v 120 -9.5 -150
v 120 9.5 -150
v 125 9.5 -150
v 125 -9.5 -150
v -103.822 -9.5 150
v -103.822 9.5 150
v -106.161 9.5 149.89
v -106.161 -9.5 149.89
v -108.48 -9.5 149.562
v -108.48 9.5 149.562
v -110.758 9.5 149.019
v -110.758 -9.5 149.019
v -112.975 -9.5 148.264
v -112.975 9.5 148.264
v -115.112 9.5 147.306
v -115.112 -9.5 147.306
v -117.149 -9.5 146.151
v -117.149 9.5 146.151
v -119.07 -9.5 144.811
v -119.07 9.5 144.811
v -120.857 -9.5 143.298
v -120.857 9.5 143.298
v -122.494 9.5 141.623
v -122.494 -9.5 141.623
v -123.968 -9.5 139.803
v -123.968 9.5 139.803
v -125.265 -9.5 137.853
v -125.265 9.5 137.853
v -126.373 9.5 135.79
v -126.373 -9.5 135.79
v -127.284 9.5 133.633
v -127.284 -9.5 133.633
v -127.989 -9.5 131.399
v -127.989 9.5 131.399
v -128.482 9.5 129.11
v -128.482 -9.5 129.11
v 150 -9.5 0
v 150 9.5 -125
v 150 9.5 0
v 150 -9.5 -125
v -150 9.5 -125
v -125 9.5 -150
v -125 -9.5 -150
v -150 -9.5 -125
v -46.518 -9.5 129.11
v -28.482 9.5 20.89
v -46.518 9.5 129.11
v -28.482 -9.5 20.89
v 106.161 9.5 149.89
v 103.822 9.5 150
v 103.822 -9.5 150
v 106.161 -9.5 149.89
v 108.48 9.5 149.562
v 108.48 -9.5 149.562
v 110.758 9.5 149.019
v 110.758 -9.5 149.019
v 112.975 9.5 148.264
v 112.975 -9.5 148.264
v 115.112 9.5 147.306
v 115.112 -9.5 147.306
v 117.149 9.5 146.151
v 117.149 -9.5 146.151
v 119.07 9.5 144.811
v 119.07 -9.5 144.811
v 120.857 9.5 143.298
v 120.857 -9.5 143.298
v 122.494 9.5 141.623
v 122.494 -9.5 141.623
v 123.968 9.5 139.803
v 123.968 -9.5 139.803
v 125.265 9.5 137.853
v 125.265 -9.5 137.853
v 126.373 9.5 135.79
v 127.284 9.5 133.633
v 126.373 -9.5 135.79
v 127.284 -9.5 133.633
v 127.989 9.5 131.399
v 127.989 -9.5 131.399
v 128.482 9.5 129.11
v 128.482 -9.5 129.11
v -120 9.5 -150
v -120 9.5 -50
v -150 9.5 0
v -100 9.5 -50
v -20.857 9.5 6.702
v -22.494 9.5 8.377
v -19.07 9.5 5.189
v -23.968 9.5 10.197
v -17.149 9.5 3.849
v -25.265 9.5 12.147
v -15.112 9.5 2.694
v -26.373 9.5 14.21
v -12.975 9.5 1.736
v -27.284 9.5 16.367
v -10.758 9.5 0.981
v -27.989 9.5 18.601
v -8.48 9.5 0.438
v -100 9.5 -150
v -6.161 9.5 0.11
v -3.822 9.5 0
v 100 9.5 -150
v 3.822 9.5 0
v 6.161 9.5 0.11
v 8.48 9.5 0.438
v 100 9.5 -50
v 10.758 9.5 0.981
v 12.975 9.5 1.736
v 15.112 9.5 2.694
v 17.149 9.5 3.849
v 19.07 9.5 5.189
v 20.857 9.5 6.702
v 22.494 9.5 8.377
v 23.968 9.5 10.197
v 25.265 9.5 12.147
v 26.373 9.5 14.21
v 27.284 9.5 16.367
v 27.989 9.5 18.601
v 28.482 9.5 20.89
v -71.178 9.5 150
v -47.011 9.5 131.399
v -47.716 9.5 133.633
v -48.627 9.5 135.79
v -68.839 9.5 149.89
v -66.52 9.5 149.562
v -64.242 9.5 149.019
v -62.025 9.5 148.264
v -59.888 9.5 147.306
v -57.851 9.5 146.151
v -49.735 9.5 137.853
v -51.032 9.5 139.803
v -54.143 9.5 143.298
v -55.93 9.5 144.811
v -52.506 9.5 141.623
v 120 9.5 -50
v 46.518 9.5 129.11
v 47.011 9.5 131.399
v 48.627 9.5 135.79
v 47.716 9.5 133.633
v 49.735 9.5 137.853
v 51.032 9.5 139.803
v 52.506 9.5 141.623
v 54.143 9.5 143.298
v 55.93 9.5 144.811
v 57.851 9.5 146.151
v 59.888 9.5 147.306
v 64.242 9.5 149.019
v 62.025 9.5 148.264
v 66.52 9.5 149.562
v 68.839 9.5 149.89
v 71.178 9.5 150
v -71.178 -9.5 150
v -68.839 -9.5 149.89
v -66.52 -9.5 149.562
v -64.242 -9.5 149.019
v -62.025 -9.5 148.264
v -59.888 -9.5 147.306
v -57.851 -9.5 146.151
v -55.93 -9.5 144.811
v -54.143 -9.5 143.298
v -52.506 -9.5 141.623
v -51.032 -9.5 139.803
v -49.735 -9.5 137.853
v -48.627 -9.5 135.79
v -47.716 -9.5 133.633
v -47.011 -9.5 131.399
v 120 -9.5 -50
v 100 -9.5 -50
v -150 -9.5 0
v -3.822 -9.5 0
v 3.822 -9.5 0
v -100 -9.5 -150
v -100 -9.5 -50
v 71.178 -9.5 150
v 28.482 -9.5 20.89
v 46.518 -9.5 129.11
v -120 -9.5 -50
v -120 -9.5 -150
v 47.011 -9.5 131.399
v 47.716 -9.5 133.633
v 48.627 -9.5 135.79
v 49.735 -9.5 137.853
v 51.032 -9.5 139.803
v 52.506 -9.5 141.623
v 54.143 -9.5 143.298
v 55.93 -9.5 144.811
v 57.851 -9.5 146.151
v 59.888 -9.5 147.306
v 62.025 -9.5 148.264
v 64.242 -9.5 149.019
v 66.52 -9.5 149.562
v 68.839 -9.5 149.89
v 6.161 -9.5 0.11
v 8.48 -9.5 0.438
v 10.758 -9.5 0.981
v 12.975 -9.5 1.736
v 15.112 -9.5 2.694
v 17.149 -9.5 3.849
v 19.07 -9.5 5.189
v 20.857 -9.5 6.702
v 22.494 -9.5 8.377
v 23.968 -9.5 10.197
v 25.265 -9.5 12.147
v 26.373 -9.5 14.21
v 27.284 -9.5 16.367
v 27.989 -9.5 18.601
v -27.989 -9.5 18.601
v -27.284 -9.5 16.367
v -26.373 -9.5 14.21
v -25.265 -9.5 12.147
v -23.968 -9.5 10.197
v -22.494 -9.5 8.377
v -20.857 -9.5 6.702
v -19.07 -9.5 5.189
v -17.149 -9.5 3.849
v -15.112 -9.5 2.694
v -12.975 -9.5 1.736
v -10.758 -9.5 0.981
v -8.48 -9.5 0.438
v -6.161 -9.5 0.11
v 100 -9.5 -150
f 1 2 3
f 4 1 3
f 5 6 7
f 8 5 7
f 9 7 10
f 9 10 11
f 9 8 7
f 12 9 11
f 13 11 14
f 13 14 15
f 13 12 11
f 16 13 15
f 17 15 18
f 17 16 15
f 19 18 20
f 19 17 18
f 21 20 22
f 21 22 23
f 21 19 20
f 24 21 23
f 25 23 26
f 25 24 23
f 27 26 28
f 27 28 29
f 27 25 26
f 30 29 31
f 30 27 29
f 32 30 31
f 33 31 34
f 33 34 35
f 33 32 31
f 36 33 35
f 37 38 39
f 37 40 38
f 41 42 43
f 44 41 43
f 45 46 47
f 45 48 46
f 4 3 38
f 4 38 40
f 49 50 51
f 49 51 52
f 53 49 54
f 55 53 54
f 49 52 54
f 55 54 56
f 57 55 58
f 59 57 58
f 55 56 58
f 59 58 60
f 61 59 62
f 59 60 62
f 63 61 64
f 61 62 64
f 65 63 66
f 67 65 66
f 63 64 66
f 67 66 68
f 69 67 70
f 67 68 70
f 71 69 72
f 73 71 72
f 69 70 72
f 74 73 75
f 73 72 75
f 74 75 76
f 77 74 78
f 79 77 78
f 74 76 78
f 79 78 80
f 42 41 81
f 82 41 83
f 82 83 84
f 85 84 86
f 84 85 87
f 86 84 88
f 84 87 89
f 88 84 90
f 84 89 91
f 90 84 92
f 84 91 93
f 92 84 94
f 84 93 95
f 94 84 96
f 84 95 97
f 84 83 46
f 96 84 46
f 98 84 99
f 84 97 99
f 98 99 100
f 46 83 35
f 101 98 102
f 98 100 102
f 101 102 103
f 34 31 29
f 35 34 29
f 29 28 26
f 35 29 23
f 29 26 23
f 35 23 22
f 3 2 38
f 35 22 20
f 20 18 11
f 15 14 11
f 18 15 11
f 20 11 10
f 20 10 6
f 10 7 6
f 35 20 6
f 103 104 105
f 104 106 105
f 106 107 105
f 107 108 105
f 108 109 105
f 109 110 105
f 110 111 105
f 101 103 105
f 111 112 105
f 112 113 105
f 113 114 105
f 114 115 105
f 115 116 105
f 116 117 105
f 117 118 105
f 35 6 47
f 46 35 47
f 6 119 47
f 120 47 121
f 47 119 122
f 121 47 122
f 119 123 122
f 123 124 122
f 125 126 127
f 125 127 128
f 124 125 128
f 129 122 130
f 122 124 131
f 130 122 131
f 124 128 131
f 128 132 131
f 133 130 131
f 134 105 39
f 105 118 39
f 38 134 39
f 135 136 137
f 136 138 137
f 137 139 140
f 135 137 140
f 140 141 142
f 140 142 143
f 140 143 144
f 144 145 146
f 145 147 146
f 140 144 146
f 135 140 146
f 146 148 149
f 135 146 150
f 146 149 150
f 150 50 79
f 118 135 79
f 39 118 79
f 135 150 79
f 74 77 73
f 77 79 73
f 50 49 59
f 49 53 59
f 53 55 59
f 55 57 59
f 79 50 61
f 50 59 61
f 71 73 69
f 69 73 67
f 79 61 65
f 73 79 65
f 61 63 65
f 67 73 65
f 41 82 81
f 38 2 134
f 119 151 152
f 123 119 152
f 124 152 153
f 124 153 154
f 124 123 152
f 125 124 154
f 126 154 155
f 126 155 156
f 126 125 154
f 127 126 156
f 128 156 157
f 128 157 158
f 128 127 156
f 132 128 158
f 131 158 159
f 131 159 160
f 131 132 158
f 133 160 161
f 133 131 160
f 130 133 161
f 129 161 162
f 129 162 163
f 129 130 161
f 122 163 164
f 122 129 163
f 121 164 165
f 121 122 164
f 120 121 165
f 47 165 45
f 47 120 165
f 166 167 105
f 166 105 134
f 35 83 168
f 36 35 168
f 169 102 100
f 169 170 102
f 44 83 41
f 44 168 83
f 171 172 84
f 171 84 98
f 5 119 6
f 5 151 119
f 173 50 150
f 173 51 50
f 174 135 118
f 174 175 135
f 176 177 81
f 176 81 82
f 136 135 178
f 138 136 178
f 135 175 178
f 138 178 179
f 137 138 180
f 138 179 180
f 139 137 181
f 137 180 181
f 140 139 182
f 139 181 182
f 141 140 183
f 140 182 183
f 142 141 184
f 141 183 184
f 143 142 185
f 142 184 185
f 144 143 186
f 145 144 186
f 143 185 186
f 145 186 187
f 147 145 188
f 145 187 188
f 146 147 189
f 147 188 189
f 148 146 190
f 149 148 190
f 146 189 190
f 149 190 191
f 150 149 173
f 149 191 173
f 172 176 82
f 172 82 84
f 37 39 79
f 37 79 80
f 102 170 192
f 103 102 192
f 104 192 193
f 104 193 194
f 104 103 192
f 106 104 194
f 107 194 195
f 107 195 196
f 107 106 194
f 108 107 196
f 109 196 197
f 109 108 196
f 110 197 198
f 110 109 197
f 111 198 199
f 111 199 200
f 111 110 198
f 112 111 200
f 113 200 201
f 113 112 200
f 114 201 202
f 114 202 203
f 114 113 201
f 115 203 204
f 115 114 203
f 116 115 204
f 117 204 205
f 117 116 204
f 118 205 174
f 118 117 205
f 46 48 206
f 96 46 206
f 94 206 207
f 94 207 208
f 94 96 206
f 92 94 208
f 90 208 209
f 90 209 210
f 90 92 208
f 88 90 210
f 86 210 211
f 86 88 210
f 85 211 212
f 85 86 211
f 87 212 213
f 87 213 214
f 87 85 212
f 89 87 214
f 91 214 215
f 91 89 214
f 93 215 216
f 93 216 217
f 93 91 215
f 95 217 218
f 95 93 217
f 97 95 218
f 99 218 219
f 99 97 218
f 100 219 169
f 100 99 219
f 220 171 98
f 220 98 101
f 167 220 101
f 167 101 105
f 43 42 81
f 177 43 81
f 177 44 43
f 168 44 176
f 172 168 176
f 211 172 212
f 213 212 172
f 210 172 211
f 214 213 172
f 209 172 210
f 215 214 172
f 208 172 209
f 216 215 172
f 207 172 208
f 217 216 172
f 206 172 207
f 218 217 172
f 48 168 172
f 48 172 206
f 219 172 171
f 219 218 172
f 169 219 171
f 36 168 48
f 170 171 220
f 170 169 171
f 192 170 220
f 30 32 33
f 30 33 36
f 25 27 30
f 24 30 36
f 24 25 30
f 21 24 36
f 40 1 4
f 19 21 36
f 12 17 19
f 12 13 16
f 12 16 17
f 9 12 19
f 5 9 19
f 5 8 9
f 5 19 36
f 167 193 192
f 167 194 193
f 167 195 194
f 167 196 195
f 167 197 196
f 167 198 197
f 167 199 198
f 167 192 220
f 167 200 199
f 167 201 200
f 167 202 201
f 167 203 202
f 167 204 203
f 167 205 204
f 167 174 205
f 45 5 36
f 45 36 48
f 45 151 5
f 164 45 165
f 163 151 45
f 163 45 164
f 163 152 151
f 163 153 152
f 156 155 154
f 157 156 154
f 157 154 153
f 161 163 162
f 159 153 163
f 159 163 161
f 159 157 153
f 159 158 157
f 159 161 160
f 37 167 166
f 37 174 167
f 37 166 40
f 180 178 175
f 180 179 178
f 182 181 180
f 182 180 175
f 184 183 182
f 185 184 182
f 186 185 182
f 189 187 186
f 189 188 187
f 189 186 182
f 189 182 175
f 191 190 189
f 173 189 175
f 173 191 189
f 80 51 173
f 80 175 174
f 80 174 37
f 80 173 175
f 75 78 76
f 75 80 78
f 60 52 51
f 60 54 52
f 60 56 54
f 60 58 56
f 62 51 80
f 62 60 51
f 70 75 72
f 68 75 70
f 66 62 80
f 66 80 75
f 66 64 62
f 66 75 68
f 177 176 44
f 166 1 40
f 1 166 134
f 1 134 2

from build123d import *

# Parameters (mm, degrees)
F1_DEPTH = 9.5
F2_SIZE2 = 150
F2_SIZE  = 25
F3_SIZE2 = 150
F3_SIZE  = 25
F4_R     = 25
F5_SIZE  = 25


with BuildPart() as f1:
    # F0 (on Front) → F1 (new body, symmetric)
    with BuildSketch(Plane.XZ):
        Polygon((-50, 150), (-150, 150), (-150, -150), (-120, -150), (-120, -50), (-100, -50), (-100, -150), (0, -150), (100, -150), (100, -50), (120, -50), (120, -150), (150, -150), (150, 150), (50, 150), (25, 0), (0, 0), (-25, 0), align=None)
    extrude(amount=F1_DEPTH, both=True)

    # F2
    f2_edges = [f1.edges().sort_by_distance(p)[0] for p in [
        (150, 0, 150),
    ]]
    f2_side = f1.faces().sort_by_distance((100, 0, 150))[0]
    chamfer(f2_edges, length=F2_SIZE, length2=F2_SIZE2, reference=f2_side)

    # F3
    f3_edges = [f1.edges().sort_by_distance(p)[0] for p in [
        (-150, 0, 150),
    ]]
    f3_side = f1.faces().sort_by_distance((-100, 0, 150))[0]
    chamfer(f3_edges, length=F3_SIZE, length2=F3_SIZE2, reference=f3_side)

    # F4
    f4_edges = [f1.edges().sort_by_distance(p)[0] for p in [
        (-125, 0, 150),
        (-50, 0, 150),
        (50, 0, 150),
        (125, 0, 150),
        (25, 0, 0),
        (-25, 0, 0),
    ]]
    fillet(f4_edges, radius=F4_R)

    # F5
    f5_edges = [f1.edges().sort_by_distance(p)[0] for p in [
        (-150, 0, -150),
        (150, 0, -150),
    ]]
    chamfer(f5_edges, length=F5_SIZE)


solid = f1.part
